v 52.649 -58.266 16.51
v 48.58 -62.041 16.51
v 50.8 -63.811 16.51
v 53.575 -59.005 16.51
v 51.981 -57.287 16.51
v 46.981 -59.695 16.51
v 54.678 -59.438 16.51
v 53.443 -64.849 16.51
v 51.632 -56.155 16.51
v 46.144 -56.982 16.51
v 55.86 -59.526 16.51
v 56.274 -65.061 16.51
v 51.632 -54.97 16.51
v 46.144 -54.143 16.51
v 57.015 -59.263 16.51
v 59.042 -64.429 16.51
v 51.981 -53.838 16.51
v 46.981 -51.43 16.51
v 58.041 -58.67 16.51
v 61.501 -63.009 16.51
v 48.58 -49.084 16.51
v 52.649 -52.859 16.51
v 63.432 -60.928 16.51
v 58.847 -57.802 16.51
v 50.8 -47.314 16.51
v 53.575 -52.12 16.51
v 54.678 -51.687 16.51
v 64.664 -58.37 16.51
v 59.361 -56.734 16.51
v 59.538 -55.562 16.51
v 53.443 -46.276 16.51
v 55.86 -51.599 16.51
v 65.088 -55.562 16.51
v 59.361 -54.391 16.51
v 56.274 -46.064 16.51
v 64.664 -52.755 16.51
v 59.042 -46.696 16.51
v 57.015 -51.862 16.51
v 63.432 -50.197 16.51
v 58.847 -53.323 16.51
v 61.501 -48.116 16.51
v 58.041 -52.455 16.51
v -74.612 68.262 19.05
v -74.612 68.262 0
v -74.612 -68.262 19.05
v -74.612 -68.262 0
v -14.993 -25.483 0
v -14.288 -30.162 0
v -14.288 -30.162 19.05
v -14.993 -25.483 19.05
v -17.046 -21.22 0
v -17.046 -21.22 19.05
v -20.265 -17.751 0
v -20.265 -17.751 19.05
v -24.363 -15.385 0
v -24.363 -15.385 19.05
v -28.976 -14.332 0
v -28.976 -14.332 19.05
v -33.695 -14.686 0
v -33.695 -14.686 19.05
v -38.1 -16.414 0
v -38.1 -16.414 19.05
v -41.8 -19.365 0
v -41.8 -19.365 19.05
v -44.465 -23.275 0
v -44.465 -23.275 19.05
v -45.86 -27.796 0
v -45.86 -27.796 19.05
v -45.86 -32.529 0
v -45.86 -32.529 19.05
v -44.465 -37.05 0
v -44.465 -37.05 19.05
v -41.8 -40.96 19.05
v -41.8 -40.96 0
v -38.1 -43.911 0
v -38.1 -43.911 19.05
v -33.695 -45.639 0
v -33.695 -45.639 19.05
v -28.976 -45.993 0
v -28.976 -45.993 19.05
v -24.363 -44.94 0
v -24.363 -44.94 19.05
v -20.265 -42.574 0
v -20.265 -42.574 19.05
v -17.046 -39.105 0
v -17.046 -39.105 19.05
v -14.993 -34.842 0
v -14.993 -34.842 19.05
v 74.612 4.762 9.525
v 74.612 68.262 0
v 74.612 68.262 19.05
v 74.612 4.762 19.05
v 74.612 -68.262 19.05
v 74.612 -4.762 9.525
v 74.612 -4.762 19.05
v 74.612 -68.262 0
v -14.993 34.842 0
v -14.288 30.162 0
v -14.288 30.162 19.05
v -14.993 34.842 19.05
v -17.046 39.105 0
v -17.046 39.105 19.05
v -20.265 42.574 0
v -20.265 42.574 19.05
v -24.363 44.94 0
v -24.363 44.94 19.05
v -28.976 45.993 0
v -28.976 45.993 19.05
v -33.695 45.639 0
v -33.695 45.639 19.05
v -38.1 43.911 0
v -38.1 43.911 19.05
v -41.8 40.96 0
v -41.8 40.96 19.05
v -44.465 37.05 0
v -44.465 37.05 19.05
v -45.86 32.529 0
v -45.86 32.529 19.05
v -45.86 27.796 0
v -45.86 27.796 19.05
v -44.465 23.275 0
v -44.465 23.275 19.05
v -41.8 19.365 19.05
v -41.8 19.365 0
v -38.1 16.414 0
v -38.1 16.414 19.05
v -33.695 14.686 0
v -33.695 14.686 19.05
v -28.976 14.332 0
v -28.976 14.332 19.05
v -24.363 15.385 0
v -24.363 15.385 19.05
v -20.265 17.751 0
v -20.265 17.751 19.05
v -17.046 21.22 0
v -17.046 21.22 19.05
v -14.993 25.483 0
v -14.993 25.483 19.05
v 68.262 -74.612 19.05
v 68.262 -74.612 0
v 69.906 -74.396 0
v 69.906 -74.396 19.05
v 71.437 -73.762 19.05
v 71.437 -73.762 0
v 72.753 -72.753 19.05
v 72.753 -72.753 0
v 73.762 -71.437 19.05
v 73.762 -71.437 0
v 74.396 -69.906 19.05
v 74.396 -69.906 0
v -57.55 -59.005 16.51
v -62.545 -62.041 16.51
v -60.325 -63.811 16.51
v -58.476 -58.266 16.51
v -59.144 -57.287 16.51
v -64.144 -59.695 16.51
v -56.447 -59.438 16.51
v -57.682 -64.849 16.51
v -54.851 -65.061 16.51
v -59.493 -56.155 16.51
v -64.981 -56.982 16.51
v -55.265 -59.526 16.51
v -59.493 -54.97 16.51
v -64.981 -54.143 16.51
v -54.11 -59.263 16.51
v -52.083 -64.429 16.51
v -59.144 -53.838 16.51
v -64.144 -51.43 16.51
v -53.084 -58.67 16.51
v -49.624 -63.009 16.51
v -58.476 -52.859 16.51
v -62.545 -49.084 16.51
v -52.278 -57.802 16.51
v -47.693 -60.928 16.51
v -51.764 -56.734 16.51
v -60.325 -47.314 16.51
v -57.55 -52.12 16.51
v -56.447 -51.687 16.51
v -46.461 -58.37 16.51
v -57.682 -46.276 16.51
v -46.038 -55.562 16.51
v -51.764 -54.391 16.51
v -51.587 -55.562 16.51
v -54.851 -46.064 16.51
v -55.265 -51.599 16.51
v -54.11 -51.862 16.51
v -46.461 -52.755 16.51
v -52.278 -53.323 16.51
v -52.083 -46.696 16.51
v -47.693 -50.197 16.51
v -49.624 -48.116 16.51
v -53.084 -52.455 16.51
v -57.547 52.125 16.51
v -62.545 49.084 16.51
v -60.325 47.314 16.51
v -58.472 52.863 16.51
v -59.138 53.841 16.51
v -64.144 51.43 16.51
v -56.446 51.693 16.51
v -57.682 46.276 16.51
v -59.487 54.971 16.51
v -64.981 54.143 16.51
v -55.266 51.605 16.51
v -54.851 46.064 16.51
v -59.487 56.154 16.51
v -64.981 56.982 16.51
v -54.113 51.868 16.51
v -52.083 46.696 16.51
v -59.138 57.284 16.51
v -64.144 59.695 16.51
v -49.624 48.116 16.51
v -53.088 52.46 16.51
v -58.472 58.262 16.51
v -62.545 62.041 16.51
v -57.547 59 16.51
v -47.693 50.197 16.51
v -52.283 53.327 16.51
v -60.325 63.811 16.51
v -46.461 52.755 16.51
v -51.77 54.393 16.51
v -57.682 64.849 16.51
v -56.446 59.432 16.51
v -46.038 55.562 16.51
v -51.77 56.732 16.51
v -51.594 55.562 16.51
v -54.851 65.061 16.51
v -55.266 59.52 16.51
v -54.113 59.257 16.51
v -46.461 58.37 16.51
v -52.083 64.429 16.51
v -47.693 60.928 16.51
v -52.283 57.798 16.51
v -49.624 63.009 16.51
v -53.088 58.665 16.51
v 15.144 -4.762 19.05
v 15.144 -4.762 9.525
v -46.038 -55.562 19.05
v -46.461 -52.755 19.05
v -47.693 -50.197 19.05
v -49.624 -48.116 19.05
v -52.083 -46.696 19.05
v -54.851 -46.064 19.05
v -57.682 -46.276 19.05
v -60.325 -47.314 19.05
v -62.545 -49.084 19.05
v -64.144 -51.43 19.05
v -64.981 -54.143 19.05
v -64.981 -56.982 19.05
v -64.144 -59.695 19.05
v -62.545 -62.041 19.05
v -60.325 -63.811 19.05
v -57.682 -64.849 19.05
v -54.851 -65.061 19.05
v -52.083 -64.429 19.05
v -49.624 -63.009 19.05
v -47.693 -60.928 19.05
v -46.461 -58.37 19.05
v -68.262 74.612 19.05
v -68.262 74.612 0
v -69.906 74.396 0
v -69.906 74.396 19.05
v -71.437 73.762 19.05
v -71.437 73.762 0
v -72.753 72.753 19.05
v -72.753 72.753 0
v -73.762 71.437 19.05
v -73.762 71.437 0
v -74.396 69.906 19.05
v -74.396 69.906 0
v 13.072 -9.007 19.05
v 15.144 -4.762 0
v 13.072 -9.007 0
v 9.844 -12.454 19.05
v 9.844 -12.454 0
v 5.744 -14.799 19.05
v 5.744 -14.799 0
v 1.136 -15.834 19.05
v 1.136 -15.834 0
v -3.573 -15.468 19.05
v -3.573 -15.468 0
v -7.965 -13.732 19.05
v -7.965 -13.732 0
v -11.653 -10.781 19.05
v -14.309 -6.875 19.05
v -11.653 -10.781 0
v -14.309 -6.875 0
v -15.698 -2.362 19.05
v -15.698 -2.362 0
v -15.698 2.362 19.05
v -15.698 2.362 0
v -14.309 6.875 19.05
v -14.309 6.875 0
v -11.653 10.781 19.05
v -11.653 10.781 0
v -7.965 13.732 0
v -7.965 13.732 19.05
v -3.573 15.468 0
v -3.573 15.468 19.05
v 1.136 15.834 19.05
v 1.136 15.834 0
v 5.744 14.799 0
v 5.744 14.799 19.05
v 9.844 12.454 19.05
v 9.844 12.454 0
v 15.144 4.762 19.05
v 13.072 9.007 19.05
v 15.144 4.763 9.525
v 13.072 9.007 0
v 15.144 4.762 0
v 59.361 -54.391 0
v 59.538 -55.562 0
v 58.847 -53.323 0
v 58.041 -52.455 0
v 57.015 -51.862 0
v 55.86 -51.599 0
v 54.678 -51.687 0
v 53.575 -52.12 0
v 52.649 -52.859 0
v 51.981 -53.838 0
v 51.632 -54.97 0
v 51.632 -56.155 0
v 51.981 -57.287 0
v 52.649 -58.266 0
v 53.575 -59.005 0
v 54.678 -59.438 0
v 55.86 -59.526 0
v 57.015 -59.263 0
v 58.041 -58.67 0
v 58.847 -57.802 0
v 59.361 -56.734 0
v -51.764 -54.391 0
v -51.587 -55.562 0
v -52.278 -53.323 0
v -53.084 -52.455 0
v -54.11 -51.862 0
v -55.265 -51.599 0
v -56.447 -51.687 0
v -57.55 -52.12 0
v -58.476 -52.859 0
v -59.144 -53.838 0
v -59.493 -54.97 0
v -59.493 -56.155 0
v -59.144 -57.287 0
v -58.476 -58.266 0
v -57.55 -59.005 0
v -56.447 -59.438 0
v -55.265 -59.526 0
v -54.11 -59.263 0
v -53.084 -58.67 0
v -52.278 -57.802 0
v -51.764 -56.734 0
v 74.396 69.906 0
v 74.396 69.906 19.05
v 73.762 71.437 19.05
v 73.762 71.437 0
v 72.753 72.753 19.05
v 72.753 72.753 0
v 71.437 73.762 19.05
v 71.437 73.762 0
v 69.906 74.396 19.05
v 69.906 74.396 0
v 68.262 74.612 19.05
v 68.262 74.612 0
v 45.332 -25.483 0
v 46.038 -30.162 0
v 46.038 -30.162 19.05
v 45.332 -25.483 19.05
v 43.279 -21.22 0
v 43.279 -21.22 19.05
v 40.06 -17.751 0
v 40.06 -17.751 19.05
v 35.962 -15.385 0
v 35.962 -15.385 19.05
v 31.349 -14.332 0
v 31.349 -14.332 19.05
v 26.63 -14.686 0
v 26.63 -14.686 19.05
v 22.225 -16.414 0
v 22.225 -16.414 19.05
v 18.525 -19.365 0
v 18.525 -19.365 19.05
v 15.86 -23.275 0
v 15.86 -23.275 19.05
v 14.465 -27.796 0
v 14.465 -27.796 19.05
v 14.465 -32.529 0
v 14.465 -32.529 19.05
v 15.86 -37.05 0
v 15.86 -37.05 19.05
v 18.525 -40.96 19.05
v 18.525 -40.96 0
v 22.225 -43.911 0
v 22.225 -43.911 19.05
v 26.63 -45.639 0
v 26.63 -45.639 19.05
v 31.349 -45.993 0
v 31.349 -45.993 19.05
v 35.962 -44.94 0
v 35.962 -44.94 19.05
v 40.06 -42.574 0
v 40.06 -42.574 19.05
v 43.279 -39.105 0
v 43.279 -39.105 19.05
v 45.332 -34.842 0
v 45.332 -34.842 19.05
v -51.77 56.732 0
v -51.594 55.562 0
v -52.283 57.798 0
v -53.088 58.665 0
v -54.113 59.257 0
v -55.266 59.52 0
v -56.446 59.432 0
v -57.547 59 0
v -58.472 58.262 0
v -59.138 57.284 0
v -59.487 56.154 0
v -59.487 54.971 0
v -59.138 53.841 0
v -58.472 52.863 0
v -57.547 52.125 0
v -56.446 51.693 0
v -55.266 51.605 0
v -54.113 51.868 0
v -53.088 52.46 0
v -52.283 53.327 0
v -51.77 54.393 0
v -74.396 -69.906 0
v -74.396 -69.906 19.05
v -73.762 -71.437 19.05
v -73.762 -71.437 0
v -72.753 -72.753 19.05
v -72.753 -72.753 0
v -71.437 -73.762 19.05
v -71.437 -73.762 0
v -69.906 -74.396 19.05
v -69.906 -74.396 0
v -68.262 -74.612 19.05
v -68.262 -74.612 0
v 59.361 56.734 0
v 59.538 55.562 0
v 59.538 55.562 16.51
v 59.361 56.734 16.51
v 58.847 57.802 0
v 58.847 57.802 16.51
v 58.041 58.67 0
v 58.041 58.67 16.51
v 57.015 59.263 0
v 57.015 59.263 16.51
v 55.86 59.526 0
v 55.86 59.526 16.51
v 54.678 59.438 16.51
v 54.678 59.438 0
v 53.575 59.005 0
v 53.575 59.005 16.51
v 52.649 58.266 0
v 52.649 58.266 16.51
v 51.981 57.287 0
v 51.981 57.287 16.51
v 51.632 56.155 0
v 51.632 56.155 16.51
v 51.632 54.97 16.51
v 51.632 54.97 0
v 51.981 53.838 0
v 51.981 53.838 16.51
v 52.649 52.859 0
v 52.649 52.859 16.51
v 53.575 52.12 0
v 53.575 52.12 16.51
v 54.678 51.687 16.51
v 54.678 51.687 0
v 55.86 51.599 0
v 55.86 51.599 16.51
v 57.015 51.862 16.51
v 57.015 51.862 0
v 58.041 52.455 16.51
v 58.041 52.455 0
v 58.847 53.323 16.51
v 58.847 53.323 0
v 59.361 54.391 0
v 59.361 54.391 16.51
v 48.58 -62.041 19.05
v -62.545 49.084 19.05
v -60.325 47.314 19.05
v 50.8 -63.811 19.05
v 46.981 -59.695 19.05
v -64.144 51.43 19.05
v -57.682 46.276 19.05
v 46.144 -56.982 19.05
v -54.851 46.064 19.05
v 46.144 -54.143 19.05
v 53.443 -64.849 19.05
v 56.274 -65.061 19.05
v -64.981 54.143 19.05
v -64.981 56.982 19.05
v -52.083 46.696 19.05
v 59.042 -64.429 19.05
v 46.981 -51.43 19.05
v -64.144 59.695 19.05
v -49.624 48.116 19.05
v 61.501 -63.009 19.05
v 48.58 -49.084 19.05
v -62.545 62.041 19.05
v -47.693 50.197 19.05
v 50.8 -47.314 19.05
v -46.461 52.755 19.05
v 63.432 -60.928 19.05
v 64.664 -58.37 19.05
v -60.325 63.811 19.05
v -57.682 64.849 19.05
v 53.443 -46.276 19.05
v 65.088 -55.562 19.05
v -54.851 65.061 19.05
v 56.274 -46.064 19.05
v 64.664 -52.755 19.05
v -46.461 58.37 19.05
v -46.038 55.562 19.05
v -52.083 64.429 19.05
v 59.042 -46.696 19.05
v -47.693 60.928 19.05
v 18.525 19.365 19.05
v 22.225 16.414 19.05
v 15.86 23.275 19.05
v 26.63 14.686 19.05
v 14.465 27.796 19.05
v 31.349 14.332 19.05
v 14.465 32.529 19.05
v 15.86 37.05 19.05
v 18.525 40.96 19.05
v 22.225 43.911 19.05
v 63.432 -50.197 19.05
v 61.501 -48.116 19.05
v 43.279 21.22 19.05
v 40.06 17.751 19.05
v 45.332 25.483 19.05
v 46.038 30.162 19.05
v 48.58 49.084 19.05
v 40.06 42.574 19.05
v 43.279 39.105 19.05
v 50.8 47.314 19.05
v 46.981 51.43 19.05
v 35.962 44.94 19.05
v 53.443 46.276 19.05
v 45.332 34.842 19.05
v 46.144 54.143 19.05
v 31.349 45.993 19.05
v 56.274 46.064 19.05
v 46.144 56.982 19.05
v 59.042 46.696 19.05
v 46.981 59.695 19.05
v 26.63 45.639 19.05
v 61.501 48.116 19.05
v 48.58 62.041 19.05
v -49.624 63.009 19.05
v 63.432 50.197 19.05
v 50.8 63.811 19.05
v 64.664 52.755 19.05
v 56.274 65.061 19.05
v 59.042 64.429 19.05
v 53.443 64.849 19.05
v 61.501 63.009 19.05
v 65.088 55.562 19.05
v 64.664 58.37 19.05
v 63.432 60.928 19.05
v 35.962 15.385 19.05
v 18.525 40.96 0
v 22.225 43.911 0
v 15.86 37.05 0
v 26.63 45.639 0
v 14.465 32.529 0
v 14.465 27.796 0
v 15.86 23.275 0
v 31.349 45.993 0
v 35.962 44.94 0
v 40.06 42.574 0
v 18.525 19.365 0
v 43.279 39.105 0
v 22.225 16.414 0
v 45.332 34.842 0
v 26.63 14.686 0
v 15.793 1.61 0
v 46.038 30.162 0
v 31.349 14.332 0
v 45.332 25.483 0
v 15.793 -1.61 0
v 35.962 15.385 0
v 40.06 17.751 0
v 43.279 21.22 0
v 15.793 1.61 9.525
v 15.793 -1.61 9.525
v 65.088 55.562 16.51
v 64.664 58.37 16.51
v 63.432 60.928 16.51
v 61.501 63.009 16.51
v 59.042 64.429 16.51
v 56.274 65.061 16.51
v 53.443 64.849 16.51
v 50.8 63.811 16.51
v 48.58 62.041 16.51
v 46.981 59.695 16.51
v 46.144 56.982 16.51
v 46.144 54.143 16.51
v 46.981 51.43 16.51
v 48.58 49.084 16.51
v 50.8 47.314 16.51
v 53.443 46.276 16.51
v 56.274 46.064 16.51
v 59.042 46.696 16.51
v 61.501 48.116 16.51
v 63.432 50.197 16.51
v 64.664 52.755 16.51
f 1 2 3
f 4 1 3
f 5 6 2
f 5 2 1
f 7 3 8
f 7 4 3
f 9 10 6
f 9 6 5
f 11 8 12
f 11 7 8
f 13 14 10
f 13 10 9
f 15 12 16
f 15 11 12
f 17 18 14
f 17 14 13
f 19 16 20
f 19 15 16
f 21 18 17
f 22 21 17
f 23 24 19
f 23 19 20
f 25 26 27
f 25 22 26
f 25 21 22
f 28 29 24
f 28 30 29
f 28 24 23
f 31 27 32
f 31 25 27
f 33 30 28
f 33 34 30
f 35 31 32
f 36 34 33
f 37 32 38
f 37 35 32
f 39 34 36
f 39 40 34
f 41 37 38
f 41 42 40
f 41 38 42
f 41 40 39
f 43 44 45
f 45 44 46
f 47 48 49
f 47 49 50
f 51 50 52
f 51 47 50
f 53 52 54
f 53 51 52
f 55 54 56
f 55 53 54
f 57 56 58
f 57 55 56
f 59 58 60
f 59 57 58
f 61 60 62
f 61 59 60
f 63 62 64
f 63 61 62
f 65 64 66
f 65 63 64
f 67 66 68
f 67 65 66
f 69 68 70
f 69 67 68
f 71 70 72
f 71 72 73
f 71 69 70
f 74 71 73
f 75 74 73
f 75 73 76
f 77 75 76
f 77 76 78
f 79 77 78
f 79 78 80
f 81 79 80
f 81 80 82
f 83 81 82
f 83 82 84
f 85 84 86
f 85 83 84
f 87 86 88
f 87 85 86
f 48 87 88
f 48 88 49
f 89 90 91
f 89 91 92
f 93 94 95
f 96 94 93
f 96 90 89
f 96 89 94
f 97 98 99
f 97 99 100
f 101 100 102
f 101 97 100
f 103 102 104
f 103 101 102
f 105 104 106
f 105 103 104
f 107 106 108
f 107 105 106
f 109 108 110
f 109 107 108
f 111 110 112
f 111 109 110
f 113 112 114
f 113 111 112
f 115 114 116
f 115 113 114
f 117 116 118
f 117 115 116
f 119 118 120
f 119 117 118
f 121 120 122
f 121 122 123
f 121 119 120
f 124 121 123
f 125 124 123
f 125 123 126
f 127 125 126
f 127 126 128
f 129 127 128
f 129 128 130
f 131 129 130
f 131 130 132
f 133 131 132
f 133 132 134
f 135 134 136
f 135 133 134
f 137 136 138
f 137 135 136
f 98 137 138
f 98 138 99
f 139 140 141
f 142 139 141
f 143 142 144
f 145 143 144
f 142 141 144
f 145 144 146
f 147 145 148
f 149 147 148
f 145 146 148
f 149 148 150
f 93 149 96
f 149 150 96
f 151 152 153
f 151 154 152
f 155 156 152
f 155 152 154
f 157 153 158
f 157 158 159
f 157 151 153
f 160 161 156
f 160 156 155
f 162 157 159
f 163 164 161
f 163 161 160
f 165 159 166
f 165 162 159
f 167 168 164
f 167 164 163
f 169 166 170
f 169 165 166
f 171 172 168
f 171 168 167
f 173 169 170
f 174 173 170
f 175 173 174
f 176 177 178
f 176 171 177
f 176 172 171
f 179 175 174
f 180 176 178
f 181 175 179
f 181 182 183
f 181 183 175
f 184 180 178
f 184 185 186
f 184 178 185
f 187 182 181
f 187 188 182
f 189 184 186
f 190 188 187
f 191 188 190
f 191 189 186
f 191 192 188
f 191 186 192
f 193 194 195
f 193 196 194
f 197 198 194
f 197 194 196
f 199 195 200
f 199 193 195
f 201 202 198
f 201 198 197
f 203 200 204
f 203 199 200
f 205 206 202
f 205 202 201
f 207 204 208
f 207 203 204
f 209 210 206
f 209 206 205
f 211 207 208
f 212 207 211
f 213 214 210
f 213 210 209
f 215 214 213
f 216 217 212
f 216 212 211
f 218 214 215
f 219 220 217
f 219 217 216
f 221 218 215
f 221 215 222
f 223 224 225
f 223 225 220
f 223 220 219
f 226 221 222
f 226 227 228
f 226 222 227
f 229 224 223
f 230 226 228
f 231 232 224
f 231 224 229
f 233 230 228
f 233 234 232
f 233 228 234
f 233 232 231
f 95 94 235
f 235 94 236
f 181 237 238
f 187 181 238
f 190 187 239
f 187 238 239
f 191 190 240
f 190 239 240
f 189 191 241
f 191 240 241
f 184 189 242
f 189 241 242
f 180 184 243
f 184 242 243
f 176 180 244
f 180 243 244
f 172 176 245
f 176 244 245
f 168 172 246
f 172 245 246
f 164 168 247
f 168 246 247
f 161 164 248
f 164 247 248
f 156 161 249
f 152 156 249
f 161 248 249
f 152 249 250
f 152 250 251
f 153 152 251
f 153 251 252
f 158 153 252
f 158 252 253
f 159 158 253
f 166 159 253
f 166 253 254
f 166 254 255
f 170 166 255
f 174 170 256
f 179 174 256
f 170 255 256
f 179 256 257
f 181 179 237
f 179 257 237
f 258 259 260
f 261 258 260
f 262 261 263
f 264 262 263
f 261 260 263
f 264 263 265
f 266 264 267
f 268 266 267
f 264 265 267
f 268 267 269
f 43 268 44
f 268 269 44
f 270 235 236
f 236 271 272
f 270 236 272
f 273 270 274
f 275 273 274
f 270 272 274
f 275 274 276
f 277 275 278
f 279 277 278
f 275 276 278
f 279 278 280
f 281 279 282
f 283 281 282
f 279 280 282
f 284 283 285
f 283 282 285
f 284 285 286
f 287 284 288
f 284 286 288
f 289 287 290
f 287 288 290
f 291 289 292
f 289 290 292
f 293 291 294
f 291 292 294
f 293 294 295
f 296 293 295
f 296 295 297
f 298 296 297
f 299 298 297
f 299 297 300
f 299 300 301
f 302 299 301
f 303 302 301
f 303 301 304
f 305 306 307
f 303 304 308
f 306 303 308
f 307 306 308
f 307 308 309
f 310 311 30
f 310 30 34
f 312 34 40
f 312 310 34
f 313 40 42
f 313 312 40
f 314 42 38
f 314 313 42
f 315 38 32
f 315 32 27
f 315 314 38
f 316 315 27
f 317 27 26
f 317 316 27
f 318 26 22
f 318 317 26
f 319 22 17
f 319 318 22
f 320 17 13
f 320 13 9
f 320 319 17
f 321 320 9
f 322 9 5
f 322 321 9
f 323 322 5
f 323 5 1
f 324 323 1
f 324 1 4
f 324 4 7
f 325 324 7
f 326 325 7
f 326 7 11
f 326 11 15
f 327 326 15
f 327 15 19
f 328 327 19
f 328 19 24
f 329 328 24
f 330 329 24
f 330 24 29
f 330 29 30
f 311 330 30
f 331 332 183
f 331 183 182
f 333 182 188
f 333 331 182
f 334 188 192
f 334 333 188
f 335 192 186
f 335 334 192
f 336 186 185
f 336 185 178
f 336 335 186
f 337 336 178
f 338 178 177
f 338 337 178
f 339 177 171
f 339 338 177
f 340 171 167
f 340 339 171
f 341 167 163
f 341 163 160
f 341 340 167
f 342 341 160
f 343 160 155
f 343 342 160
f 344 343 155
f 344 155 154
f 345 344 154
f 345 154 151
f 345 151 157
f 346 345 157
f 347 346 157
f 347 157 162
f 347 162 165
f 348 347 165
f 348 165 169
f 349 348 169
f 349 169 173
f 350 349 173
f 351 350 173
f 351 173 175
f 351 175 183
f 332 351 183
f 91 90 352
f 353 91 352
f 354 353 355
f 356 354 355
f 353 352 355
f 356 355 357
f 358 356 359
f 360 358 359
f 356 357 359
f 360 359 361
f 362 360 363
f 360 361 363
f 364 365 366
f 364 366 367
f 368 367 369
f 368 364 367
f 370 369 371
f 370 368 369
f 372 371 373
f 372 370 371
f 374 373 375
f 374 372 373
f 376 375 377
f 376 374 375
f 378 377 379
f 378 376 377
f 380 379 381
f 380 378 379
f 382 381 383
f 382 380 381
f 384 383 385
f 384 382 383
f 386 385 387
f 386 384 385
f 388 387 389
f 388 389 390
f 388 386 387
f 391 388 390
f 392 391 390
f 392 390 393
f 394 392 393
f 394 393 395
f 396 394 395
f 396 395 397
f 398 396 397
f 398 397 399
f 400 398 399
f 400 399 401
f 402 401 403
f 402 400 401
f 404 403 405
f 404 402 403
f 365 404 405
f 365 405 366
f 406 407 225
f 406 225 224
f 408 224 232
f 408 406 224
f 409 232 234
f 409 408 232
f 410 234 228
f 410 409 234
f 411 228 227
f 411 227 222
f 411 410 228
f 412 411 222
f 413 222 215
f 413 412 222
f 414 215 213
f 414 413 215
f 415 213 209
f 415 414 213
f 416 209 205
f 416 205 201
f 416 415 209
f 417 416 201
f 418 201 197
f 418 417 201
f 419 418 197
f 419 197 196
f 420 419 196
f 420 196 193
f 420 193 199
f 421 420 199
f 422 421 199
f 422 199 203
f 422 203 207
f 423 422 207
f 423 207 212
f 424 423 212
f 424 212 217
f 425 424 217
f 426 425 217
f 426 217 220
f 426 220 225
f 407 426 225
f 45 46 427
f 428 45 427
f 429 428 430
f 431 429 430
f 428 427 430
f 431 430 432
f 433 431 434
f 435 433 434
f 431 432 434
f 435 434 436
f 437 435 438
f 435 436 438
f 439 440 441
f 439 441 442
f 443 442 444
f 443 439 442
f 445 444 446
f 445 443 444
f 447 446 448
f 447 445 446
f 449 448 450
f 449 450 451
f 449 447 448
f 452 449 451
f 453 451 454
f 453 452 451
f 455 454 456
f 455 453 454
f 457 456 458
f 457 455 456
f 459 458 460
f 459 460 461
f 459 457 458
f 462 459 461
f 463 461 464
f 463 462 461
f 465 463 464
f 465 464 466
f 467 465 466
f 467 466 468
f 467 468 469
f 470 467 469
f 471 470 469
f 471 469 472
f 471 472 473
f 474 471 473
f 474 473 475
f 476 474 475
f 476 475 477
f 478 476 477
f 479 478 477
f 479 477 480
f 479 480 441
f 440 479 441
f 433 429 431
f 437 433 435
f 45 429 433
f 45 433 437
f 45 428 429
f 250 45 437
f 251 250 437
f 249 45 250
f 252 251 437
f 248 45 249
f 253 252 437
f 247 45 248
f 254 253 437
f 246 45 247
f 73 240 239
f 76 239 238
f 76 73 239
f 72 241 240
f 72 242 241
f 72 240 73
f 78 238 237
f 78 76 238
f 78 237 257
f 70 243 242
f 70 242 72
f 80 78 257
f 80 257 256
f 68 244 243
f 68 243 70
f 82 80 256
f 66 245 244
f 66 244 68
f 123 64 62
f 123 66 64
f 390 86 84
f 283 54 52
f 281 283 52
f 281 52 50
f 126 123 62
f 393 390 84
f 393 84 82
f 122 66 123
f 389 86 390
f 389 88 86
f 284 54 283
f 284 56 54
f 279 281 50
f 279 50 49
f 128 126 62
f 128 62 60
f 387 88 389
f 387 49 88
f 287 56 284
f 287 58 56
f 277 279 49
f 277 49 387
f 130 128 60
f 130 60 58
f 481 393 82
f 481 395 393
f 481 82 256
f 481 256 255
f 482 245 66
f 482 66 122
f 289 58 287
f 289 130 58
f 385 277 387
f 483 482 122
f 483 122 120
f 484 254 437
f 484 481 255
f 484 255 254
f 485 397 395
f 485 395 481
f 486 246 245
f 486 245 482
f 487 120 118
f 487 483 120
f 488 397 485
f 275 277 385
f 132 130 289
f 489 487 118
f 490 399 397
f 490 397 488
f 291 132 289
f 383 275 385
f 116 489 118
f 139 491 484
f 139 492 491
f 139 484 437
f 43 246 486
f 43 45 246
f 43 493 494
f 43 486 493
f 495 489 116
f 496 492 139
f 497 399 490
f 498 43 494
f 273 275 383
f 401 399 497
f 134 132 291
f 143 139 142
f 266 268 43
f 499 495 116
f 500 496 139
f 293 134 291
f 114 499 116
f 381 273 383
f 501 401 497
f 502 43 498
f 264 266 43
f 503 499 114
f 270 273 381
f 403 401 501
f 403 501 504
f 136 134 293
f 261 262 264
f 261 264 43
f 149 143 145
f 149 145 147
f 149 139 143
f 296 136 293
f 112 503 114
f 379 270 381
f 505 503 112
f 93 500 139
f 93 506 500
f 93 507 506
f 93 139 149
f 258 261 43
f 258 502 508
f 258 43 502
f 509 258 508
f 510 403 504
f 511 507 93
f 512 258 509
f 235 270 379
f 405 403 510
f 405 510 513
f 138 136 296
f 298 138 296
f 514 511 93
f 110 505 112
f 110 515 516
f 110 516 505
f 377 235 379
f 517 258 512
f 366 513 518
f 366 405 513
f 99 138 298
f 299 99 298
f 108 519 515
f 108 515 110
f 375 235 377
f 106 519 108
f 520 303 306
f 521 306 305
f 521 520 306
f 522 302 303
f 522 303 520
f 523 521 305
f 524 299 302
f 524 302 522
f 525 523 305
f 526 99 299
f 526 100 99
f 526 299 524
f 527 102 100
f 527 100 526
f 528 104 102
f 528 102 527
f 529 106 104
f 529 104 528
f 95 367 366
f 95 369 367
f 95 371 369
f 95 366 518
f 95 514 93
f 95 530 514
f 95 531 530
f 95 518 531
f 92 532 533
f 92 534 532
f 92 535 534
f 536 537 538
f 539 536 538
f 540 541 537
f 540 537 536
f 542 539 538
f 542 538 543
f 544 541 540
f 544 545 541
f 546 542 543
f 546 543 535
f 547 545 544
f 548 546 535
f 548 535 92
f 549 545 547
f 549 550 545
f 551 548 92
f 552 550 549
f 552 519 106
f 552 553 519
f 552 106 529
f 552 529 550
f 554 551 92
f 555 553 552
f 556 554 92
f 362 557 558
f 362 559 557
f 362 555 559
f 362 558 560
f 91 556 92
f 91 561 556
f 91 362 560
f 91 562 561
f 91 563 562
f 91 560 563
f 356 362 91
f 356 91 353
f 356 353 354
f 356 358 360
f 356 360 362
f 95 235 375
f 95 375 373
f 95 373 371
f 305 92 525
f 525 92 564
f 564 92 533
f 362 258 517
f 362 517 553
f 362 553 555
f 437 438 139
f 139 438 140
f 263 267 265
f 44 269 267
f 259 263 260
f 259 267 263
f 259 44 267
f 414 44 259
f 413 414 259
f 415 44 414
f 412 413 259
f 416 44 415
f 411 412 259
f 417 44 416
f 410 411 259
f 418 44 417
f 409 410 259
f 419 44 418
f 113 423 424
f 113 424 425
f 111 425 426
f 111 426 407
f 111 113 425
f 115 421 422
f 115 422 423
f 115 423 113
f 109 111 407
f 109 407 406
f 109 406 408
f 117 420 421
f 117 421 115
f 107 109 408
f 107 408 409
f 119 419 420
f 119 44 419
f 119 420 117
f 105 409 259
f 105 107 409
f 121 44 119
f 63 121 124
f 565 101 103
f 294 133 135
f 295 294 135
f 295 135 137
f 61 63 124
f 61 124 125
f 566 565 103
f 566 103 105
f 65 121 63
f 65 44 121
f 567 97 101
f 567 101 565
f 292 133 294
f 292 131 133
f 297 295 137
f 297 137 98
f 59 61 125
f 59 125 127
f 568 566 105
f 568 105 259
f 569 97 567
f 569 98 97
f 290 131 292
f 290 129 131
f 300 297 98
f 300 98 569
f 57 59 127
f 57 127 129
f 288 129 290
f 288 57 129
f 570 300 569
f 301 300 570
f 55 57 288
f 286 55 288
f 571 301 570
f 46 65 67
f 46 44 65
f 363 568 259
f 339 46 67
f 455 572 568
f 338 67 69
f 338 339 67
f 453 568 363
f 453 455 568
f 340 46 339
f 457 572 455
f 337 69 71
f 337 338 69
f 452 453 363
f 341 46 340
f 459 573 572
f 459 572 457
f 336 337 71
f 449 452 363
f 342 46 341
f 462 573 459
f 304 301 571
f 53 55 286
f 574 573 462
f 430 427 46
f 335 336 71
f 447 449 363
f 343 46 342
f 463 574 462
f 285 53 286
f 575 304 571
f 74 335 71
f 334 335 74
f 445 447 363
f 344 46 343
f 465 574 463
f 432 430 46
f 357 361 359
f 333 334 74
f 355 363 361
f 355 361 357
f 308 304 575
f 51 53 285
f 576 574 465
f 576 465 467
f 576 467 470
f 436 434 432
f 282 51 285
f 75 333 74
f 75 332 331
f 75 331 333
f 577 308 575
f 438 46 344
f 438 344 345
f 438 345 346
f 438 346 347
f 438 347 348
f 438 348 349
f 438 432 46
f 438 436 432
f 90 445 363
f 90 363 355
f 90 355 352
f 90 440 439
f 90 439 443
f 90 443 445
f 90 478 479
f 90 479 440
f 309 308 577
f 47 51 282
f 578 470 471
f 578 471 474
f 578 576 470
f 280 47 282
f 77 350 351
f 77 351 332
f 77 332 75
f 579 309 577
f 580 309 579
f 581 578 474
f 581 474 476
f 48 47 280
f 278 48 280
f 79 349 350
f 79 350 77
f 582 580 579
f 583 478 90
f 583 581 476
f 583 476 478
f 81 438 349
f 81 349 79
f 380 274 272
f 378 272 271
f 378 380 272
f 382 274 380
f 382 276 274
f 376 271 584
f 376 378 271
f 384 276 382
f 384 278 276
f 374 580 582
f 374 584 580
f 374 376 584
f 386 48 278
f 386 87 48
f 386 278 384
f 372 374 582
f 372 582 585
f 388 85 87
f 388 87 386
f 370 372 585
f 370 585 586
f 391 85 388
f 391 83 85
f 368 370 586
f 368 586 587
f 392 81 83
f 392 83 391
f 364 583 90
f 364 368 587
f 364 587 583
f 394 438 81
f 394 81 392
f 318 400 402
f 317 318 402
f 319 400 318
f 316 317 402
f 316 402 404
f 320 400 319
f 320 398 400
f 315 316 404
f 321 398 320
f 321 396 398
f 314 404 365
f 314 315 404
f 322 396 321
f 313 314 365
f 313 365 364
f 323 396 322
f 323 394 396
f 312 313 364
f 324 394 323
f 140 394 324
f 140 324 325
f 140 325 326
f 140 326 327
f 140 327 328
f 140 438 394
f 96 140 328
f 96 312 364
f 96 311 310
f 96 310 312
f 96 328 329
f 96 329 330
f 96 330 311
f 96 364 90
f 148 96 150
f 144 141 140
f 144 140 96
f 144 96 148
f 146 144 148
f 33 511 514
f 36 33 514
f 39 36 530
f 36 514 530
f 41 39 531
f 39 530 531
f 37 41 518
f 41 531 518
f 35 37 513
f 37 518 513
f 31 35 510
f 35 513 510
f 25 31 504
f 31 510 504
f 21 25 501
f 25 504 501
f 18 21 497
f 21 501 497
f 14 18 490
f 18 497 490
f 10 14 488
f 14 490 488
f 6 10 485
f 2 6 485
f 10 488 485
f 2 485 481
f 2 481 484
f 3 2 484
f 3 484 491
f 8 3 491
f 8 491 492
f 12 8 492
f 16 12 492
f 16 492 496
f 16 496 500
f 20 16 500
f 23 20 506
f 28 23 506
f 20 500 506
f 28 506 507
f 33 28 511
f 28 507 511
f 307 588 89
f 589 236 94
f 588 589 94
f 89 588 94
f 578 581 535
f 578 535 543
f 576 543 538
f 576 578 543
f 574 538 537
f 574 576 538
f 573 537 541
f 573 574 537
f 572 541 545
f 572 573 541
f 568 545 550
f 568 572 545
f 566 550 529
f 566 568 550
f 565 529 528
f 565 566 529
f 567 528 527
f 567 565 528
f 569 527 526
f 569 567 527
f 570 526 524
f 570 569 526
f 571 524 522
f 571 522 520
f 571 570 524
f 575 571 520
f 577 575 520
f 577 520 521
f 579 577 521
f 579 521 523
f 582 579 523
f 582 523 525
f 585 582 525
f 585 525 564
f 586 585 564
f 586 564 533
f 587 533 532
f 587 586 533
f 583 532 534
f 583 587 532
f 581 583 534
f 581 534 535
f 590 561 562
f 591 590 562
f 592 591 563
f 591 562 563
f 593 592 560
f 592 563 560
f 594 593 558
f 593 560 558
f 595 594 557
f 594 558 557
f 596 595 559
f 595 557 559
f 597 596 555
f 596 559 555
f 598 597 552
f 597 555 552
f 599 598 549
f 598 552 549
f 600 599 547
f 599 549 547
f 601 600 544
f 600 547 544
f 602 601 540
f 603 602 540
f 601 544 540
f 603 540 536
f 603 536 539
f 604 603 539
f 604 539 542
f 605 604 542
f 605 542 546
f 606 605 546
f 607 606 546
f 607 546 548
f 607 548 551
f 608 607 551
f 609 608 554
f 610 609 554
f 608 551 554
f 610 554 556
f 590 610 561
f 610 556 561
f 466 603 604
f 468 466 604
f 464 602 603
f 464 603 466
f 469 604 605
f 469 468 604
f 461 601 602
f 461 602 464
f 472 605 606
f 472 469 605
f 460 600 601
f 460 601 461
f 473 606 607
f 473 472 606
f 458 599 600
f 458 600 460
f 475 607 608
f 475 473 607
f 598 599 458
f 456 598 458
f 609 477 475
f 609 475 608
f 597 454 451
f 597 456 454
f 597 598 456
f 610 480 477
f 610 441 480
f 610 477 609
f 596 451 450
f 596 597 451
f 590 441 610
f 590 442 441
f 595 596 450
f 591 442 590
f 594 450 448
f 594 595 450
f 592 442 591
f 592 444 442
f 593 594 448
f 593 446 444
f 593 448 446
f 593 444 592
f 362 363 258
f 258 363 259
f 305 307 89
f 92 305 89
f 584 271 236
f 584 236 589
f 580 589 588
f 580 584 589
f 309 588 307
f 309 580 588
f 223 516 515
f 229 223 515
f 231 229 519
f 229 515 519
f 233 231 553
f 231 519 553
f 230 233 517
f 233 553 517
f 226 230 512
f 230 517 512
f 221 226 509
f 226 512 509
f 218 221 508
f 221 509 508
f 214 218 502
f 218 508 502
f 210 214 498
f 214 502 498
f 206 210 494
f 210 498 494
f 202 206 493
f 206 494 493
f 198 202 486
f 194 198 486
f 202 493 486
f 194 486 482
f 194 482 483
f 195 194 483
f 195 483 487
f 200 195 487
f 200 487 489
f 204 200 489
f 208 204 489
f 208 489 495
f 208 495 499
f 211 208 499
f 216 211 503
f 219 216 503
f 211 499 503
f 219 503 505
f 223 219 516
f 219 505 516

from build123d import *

# Parameters (mm, degrees)
F0_R     = 3.9751
F0_R_2   = 15.875
F0_R_3   = 3.96875
F1_DEPTH = 19.05
F3_DEPTH = 9.525
F5_R     = 9.525
F5_R_2   = 3.9751
F5_R_3   = 3.96875
F6_DEPTH = 2.54


# Not quite as in the source:
# - a feature of the source that left no trace in its solid (it failed there, or was rolled back) is left out


with BuildPart() as f1:
    # F0 (on Top) → F1 (new body)
    with BuildSketch(Plane.XY):
        with BuildLine():
            Line((-68.2625, -74.6125), (68.2625, -74.6125))
            ThreePointArc((68.2625, -74.6125), (72.7526280605, -72.7526280605), (74.6125, -68.2625))
            Line((74.6125, -68.2625), (74.6125, -4.7625))
            Line((74.6125, -4.7625), (15.1437848225, -4.7625))
            ThreePointArc((15.1437848225, -4.7625), (-15.875, 0), (15.1437848225, 4.7625))
            Line((15.1437848225, 4.7625), (74.6125, 4.7625))
            Line((74.6125, 4.7625), (74.6125, 68.2625))
            ThreePointArc((74.6125, 68.2625), (72.7526280605, 72.7526280605), (68.2625, 74.6125))
            Line((68.2625, 74.6125), (-68.2625, 74.6125))
            ThreePointArc((-68.2625, 74.6125), (-72.7526280605, 72.7526280605), (-74.6125, 68.2625))
            Line((-74.6125, 68.2625), (-74.6125, -68.2625))
            ThreePointArc((-74.6125, -68.2625), (-72.7526280605, -72.7526280605), (-68.2625, -74.6125))
        make_face()
        with Locations((-55.5625, -55.5625)):
            Circle(F0_R, mode=Mode.SUBTRACT)
        with Locations((-30.1625, -30.1625)):
            Circle(F0_R_2, mode=Mode.SUBTRACT)
        with Locations((55.5625, -55.5625)):
            Circle(F0_R, mode=Mode.SUBTRACT)
        with Locations((30.1625, -30.1625)):
            Circle(F0_R_2, mode=Mode.SUBTRACT)
        with Locations((-30.1625, 30.1625)):
            Circle(F0_R_2, mode=Mode.SUBTRACT)
        with Locations((-55.5625, 55.5625)):
            Circle(F0_R_3, mode=Mode.SUBTRACT)
        with Locations((30.1625, 30.1625)):
            Circle(F0_R_2, mode=Mode.SUBTRACT)
        with Locations((55.5625, 55.5625)):
            Circle(F0_R, mode=Mode.SUBTRACT)
    extrude(amount=F1_DEPTH)

    # F2 (on face) → F3 (join)
    with BuildSketch(Plane(origin=(0, 0, 0), x_dir=(1, 0, 0), z_dir=(0, 0, -1))):
        with BuildLine():
            Line((74.6125, 4.7625), (15.1437848225, 4.7625))
            ThreePointArc((15.1437848225, 4.7625), (15.875, 0), (15.1437848225, -4.7625))
            Line((15.1437848225, -4.7625), (74.6125, -4.7625))
            Line((74.6125, -4.7625), (74.6125, 4.7625))
        make_face()
    extrude(amount=-F3_DEPTH)

    # F5 (on face) → F6 (cut)
    with BuildSketch(Plane.XY.offset(19.05)):
        with Locations((-55.5625, -55.5625)):
            Circle(F5_R)
        with Locations((-55.5625, -55.5625)):
            Circle(F5_R_2, mode=Mode.SUBTRACT)
        with Locations((55.5625, -55.5625)):
            Circle(F5_R)
        with Locations((55.5625, -55.5625)):
            Circle(F5_R_2, mode=Mode.SUBTRACT)
        with Locations((55.5625, 55.5625)):
            Circle(F5_R)
        with Locations((55.5625, 55.5625)):
            Circle(F5_R_2, mode=Mode.SUBTRACT)
        with Locations((-55.5625, 55.5625)):
            Circle(F5_R)
        with Locations((-55.5625, 55.5625)):
            Circle(F5_R_3, mode=Mode.SUBTRACT)
    extrude(amount=-F6_DEPTH, mode=Mode.SUBTRACT)


solid = f1.part
